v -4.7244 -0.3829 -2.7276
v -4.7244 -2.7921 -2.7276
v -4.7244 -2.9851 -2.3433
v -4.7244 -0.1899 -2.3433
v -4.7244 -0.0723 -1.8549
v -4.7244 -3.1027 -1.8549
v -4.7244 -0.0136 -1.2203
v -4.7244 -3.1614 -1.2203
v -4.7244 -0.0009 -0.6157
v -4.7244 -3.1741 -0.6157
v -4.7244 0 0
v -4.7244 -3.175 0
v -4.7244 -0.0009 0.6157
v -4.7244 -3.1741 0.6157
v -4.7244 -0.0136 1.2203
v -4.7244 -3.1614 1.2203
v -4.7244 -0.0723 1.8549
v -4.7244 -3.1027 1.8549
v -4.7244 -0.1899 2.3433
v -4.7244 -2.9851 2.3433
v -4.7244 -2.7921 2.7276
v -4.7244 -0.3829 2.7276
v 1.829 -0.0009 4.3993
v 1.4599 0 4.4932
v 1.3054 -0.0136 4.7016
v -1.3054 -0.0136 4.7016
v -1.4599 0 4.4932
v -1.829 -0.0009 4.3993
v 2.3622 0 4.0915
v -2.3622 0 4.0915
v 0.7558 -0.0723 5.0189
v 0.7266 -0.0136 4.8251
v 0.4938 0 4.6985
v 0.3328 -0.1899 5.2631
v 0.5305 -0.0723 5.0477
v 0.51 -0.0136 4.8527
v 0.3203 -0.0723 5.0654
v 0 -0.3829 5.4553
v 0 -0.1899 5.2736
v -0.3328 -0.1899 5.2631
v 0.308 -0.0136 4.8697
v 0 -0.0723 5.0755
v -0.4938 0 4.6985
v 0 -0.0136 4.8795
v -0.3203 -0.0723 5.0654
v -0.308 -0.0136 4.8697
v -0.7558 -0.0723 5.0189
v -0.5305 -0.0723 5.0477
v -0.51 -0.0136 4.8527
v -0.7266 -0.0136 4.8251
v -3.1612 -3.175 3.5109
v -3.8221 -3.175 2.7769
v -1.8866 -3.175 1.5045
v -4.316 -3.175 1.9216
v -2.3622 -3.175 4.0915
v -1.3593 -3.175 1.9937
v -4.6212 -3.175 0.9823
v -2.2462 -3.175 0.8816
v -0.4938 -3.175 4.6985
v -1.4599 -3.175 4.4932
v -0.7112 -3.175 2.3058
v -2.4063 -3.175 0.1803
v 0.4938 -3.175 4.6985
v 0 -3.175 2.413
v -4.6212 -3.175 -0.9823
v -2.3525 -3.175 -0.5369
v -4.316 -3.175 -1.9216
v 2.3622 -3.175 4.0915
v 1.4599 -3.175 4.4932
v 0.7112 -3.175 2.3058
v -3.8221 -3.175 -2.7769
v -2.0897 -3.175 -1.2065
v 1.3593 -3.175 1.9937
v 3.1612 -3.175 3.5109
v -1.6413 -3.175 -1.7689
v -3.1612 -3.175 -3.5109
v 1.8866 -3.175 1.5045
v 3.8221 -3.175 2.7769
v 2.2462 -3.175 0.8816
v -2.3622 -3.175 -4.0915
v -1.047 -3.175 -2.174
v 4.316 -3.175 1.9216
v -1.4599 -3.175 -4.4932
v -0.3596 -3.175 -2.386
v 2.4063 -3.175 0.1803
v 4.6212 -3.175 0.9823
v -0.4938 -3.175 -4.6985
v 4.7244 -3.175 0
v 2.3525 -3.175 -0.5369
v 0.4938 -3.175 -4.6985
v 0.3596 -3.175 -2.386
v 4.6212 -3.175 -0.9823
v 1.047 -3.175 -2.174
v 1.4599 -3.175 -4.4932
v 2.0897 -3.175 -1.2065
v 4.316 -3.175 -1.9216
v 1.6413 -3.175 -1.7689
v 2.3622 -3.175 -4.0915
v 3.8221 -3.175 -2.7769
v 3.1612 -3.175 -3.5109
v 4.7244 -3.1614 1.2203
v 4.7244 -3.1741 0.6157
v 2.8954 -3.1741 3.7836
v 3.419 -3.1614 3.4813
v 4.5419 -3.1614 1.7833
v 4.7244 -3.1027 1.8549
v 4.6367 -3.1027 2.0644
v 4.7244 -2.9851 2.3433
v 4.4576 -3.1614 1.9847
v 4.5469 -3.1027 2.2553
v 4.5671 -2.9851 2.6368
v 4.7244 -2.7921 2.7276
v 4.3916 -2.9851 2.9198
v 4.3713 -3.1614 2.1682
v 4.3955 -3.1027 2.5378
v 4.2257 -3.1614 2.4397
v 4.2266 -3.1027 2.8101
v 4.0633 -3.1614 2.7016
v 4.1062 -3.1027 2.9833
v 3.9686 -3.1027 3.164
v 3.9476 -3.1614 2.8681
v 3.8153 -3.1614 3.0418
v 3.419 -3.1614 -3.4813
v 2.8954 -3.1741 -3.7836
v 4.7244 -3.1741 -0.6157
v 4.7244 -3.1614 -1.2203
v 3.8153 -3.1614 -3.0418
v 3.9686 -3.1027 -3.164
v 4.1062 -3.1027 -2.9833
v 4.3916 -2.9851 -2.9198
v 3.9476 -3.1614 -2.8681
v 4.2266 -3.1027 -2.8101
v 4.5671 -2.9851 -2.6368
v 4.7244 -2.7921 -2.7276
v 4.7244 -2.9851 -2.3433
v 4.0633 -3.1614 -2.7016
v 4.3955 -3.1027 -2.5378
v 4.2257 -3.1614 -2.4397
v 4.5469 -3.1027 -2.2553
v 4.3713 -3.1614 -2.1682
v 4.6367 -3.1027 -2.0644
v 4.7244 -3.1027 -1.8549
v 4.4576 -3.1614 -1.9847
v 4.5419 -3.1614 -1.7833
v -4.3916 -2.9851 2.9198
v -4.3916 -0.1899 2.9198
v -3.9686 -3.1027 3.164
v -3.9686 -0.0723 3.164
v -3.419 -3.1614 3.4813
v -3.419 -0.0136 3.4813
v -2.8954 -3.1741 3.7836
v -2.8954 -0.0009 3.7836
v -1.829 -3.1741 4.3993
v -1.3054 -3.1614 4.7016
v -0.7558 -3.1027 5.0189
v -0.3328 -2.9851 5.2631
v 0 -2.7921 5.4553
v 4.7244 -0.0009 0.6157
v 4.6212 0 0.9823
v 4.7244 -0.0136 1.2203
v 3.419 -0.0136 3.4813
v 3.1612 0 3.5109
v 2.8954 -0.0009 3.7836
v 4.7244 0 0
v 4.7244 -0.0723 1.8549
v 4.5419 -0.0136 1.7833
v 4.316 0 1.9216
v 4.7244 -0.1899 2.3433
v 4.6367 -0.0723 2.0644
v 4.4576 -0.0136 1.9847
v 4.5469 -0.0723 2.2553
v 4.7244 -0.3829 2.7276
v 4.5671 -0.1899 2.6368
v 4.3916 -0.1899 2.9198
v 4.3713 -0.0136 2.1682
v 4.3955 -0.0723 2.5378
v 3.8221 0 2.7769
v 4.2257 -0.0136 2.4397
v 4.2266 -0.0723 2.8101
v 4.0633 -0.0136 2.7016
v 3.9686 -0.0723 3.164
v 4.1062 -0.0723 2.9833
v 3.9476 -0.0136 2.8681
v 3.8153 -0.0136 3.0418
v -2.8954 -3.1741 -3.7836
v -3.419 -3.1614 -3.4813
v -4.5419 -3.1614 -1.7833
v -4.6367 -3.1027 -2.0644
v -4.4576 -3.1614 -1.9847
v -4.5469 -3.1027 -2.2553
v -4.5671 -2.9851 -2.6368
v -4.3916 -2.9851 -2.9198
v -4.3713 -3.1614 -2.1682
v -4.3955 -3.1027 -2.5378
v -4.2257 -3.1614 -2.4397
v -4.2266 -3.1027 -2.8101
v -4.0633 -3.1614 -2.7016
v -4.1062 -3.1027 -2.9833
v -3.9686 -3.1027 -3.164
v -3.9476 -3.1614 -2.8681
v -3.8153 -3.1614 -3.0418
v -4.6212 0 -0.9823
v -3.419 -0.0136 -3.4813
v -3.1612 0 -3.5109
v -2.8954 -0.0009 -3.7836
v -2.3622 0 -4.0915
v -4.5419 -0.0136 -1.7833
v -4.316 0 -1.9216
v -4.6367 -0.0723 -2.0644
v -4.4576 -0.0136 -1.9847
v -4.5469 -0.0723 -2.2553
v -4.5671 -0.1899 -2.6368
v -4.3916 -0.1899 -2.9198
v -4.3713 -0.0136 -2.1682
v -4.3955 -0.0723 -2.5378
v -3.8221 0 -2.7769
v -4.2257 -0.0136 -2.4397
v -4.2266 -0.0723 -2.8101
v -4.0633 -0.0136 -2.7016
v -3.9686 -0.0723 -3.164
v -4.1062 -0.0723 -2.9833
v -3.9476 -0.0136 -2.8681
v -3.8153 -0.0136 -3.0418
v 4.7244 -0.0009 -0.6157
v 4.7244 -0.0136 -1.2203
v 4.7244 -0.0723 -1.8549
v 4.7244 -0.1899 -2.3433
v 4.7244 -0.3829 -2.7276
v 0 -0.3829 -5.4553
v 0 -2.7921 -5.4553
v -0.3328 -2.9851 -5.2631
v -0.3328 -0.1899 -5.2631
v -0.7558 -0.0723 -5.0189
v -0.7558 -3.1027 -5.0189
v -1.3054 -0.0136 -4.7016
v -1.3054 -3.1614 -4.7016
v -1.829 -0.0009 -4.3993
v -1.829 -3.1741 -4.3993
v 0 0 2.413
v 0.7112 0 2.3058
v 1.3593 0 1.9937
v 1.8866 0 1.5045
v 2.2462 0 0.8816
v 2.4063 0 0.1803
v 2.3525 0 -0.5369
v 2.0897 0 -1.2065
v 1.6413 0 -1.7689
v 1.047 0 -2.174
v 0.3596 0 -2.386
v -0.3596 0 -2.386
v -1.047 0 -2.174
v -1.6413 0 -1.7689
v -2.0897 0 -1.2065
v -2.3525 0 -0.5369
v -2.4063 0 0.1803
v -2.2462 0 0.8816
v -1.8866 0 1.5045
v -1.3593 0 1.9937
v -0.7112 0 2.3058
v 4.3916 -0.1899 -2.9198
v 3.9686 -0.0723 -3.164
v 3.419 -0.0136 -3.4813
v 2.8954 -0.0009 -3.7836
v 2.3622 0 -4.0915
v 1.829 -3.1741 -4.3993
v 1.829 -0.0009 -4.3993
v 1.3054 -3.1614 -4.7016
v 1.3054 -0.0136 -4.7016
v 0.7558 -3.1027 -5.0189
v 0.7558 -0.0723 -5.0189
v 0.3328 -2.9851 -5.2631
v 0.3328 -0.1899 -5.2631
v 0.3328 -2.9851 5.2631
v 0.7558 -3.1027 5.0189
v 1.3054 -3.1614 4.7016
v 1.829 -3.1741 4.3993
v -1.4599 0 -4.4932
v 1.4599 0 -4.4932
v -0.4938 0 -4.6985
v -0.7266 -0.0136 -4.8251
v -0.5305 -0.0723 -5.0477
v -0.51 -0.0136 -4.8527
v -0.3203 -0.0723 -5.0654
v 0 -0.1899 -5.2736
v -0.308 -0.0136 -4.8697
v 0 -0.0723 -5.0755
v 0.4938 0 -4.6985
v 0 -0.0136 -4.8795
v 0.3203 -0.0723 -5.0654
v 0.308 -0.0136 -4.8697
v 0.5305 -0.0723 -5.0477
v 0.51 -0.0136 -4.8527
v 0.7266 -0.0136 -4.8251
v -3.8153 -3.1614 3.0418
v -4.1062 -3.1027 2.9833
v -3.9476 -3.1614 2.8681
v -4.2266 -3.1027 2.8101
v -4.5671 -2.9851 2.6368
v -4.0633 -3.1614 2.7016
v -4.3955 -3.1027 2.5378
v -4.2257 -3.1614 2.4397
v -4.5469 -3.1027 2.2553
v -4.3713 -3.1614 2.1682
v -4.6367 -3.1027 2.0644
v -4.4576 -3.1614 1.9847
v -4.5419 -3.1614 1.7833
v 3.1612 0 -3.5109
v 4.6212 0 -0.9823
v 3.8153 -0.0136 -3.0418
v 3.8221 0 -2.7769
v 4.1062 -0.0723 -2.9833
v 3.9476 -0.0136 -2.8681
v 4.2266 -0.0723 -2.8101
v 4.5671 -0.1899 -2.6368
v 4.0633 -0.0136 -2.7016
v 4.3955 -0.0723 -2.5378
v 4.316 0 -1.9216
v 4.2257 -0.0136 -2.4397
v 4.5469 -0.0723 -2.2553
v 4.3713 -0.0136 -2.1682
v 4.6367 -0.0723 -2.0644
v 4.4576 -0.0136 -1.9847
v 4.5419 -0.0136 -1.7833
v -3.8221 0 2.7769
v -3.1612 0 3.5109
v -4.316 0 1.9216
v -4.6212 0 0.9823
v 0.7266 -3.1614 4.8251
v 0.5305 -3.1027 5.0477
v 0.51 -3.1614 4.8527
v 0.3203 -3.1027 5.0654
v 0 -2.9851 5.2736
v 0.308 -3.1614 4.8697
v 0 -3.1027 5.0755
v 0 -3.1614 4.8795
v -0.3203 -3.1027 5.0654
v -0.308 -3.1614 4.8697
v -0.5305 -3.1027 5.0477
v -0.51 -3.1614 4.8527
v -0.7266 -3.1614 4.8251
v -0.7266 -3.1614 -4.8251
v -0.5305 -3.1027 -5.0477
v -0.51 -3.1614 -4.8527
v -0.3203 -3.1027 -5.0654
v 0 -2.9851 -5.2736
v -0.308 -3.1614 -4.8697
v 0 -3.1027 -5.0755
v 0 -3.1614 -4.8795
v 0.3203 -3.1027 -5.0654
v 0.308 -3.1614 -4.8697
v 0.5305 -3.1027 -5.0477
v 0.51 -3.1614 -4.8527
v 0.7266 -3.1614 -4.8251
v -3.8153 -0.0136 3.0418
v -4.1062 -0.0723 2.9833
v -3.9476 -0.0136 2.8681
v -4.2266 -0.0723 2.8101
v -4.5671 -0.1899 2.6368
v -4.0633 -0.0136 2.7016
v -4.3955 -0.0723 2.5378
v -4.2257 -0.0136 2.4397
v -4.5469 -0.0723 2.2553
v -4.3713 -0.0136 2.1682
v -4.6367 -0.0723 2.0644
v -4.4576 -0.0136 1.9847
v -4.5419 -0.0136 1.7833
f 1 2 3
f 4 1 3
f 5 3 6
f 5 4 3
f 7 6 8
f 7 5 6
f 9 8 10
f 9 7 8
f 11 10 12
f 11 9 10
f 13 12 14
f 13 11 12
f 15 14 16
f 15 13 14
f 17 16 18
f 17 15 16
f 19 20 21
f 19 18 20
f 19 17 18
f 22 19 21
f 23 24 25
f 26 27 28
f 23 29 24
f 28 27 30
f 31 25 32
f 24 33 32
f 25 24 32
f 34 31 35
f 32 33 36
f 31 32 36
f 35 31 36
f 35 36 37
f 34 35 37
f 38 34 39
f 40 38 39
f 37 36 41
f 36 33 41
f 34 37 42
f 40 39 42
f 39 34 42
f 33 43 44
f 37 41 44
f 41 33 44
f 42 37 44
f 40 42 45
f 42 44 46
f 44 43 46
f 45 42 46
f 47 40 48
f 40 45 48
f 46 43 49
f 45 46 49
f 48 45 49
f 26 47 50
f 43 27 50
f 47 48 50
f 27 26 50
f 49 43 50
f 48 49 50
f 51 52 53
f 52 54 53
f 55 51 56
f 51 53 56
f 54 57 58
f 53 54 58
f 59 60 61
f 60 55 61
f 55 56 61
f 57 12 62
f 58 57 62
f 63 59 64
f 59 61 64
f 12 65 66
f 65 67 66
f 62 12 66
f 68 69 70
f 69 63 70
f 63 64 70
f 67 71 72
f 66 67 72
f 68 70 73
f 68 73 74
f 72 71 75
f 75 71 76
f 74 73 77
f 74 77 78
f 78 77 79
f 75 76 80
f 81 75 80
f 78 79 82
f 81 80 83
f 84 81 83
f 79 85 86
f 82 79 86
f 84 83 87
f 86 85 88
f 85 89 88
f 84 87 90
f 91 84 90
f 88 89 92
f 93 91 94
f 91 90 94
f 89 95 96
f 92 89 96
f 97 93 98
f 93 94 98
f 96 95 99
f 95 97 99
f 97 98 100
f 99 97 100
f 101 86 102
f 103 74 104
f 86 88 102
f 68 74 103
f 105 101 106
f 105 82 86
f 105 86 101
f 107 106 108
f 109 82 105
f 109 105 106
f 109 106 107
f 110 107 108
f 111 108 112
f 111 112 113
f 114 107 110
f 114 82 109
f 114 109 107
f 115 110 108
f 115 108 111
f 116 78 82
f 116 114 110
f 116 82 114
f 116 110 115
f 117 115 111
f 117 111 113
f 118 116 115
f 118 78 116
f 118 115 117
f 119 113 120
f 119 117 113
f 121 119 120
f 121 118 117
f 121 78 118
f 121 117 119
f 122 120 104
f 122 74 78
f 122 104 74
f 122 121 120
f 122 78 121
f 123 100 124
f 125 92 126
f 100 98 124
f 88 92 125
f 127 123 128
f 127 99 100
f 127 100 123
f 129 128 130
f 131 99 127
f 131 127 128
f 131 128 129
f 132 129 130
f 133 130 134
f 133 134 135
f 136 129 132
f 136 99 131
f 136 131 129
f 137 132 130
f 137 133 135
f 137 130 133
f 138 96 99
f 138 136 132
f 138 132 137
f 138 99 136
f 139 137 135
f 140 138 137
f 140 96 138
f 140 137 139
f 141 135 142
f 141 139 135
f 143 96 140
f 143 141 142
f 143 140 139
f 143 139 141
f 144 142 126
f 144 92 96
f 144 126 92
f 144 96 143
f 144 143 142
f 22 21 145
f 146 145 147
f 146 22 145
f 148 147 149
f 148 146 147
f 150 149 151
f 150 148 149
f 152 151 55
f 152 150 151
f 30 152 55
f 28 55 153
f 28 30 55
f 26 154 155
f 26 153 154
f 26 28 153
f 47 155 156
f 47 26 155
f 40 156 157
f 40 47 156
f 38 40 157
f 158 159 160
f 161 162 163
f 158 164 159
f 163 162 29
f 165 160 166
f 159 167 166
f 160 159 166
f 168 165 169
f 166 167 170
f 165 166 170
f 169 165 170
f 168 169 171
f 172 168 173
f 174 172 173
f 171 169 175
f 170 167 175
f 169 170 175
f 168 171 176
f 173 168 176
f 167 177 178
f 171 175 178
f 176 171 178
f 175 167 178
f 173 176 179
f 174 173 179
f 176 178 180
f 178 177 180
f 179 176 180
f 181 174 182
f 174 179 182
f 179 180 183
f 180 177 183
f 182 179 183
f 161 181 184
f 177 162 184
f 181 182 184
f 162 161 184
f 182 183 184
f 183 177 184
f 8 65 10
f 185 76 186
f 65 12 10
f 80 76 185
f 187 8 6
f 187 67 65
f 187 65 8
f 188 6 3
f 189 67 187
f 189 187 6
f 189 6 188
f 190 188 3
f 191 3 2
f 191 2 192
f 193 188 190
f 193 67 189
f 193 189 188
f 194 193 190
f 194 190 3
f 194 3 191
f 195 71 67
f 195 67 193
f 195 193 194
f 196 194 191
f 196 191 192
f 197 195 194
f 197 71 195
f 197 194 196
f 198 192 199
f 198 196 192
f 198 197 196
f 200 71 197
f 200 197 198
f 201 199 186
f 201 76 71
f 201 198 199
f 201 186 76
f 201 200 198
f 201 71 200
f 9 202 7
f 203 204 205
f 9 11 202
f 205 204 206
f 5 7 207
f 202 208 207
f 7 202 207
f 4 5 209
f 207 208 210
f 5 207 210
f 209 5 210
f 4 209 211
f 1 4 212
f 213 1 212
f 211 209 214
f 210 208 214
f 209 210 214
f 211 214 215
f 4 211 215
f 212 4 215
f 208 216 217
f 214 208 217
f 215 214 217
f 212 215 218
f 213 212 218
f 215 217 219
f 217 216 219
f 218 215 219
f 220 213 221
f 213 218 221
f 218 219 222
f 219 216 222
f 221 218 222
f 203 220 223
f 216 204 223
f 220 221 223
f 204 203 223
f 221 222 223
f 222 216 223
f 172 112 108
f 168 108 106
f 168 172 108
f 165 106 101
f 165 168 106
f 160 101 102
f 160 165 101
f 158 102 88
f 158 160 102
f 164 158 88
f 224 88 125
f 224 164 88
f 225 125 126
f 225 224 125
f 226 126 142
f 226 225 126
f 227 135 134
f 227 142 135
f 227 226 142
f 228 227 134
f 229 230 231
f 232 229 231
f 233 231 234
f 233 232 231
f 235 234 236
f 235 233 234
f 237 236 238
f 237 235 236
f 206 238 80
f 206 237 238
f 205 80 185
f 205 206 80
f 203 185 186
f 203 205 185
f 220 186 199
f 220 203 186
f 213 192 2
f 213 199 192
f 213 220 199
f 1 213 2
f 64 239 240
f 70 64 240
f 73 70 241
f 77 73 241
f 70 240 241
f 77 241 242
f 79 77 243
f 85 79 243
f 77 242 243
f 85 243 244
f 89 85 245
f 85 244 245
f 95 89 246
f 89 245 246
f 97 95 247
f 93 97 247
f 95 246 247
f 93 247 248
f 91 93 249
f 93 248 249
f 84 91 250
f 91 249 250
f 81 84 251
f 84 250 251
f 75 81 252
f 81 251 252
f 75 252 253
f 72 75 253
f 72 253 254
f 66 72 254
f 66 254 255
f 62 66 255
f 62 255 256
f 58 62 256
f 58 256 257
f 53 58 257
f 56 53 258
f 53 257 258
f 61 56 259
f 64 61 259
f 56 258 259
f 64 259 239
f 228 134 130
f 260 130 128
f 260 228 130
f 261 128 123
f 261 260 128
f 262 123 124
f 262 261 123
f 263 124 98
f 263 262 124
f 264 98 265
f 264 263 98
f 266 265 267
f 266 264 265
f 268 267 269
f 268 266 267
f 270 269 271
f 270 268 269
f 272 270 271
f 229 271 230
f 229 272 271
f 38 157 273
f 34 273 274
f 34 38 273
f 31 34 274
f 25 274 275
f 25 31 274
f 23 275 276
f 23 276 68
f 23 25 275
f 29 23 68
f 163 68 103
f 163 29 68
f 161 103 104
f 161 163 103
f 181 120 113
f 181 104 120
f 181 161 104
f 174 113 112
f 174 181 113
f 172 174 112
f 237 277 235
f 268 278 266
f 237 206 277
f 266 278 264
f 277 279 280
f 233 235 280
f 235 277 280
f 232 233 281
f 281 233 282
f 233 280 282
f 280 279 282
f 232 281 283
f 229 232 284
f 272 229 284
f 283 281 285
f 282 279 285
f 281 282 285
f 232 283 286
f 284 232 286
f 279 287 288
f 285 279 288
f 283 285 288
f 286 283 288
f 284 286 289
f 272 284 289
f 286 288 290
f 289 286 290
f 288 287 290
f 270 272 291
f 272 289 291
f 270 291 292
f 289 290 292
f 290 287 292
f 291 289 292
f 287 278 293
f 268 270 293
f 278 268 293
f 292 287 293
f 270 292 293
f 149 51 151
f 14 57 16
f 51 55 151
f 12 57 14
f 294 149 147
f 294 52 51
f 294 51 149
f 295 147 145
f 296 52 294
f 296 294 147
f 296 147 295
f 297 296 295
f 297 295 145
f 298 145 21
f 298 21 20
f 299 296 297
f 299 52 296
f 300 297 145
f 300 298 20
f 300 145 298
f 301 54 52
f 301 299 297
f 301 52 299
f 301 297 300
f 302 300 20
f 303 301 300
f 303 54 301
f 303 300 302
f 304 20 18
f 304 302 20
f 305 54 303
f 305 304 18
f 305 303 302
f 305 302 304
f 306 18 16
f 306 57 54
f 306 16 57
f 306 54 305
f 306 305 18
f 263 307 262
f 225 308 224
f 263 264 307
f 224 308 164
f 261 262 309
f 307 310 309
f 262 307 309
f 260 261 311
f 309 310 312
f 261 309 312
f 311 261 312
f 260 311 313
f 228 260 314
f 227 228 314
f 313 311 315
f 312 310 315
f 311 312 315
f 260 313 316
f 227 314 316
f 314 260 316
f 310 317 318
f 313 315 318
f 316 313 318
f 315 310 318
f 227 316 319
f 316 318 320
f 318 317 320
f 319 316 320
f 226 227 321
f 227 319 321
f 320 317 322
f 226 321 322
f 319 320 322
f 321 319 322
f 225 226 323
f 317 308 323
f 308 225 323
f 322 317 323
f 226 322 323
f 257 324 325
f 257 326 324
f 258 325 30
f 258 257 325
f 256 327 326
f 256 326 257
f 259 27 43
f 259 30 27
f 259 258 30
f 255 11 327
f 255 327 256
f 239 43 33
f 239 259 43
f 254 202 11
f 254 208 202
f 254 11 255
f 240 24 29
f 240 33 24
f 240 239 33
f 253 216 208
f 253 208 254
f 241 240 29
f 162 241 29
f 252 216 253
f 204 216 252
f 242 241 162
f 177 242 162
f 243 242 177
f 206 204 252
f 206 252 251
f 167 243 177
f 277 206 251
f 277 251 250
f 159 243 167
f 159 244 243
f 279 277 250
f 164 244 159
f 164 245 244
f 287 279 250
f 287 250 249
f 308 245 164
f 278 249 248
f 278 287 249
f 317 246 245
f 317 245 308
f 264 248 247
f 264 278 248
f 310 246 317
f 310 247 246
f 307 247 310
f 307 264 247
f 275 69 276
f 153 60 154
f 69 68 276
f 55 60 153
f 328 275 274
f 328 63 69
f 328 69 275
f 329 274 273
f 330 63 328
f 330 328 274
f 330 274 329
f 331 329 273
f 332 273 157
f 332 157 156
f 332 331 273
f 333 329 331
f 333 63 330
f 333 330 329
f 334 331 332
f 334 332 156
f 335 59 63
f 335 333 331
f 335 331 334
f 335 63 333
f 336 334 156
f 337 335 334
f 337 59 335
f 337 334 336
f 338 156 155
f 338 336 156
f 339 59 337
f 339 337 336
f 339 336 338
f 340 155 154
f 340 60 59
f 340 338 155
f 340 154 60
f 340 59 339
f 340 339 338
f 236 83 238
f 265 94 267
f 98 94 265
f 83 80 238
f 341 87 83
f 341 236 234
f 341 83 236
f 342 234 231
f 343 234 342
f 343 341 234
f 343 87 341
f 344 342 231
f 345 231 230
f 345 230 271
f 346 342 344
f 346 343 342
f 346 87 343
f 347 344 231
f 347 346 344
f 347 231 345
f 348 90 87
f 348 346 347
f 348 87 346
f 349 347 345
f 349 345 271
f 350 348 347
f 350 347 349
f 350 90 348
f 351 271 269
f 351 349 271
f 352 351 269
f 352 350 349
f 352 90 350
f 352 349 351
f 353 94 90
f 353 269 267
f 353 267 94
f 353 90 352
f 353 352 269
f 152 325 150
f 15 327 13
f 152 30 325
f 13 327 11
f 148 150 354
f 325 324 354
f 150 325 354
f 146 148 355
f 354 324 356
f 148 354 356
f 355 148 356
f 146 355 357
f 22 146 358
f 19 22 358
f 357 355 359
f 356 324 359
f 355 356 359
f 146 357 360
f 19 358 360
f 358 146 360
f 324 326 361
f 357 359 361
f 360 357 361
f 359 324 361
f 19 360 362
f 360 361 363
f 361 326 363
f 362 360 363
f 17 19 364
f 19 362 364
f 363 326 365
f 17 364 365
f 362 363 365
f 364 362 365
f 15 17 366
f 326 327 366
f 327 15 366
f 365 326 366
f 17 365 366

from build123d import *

# Parameters (mm, degrees)
SKETCH2_R           = 2.413
BOSS_EXTRUDE2_DEPTH = 3.175


with BuildPart() as part:
    # Sketch2 → Boss-Extrude2 (new body)
    with BuildSketch(Plane(origin=(0, 0, 0), x_dir=(1, 0, 0), z_dir=(0, 1, 0))):
        Polygon((4.7244, 2.727633612), (0, 5.455267224), (-4.7244, 2.727633612), (-4.7244, -2.727633612), (0, -5.455267224), (4.7244, -2.727633612), align=None)
        with Locations(Location((0, 0, 0), (0, 0, 270))):
            Circle(SKETCH2_R, mode=Mode.SUBTRACT)
    extrude(amount=-BOSS_EXTRUDE2_DEPTH)

    # Sketch4 → Cut-Revolve1 (revolve, cut)
    with BuildSketch(Plane(origin=(0, 0, 0), x_dir=(0, 0, -1), z_dir=(1, 0, 0))):
        with BuildLine():
            Line((4.7244, 0), (0, 0))
            Line((0, 0), (0, 0.47939604))
            Line((0, 0.47939604), (5.455267224, 0.47939604))
            Line((5.455267224, 0.47939604), (5.455267224, -0.382883312))
            ThreePointArc((5.455267224, -0.382883312), (5.136942885, -0.101517068), (4.7244, 0))
        make_face()
        with BuildLine():
            Line((0, -3.65439604), (5.455267224, -3.65439604))
            Line((5.455267224, -3.65439604), (5.455267224, -2.792116688))
            ThreePointArc((5.455267224, -2.792116688), (5.136942885, -3.073482932), (4.7244, -3.175))
            Line((4.7244, -3.175), (0, -3.175))
            Line((0, -3.175), (0, -3.65439604))
        make_face()
    revolve(axis=Axis((0, -0.257604259, 0), (0, -1, 0)), mode=Mode.SUBTRACT)


solid = part.part
